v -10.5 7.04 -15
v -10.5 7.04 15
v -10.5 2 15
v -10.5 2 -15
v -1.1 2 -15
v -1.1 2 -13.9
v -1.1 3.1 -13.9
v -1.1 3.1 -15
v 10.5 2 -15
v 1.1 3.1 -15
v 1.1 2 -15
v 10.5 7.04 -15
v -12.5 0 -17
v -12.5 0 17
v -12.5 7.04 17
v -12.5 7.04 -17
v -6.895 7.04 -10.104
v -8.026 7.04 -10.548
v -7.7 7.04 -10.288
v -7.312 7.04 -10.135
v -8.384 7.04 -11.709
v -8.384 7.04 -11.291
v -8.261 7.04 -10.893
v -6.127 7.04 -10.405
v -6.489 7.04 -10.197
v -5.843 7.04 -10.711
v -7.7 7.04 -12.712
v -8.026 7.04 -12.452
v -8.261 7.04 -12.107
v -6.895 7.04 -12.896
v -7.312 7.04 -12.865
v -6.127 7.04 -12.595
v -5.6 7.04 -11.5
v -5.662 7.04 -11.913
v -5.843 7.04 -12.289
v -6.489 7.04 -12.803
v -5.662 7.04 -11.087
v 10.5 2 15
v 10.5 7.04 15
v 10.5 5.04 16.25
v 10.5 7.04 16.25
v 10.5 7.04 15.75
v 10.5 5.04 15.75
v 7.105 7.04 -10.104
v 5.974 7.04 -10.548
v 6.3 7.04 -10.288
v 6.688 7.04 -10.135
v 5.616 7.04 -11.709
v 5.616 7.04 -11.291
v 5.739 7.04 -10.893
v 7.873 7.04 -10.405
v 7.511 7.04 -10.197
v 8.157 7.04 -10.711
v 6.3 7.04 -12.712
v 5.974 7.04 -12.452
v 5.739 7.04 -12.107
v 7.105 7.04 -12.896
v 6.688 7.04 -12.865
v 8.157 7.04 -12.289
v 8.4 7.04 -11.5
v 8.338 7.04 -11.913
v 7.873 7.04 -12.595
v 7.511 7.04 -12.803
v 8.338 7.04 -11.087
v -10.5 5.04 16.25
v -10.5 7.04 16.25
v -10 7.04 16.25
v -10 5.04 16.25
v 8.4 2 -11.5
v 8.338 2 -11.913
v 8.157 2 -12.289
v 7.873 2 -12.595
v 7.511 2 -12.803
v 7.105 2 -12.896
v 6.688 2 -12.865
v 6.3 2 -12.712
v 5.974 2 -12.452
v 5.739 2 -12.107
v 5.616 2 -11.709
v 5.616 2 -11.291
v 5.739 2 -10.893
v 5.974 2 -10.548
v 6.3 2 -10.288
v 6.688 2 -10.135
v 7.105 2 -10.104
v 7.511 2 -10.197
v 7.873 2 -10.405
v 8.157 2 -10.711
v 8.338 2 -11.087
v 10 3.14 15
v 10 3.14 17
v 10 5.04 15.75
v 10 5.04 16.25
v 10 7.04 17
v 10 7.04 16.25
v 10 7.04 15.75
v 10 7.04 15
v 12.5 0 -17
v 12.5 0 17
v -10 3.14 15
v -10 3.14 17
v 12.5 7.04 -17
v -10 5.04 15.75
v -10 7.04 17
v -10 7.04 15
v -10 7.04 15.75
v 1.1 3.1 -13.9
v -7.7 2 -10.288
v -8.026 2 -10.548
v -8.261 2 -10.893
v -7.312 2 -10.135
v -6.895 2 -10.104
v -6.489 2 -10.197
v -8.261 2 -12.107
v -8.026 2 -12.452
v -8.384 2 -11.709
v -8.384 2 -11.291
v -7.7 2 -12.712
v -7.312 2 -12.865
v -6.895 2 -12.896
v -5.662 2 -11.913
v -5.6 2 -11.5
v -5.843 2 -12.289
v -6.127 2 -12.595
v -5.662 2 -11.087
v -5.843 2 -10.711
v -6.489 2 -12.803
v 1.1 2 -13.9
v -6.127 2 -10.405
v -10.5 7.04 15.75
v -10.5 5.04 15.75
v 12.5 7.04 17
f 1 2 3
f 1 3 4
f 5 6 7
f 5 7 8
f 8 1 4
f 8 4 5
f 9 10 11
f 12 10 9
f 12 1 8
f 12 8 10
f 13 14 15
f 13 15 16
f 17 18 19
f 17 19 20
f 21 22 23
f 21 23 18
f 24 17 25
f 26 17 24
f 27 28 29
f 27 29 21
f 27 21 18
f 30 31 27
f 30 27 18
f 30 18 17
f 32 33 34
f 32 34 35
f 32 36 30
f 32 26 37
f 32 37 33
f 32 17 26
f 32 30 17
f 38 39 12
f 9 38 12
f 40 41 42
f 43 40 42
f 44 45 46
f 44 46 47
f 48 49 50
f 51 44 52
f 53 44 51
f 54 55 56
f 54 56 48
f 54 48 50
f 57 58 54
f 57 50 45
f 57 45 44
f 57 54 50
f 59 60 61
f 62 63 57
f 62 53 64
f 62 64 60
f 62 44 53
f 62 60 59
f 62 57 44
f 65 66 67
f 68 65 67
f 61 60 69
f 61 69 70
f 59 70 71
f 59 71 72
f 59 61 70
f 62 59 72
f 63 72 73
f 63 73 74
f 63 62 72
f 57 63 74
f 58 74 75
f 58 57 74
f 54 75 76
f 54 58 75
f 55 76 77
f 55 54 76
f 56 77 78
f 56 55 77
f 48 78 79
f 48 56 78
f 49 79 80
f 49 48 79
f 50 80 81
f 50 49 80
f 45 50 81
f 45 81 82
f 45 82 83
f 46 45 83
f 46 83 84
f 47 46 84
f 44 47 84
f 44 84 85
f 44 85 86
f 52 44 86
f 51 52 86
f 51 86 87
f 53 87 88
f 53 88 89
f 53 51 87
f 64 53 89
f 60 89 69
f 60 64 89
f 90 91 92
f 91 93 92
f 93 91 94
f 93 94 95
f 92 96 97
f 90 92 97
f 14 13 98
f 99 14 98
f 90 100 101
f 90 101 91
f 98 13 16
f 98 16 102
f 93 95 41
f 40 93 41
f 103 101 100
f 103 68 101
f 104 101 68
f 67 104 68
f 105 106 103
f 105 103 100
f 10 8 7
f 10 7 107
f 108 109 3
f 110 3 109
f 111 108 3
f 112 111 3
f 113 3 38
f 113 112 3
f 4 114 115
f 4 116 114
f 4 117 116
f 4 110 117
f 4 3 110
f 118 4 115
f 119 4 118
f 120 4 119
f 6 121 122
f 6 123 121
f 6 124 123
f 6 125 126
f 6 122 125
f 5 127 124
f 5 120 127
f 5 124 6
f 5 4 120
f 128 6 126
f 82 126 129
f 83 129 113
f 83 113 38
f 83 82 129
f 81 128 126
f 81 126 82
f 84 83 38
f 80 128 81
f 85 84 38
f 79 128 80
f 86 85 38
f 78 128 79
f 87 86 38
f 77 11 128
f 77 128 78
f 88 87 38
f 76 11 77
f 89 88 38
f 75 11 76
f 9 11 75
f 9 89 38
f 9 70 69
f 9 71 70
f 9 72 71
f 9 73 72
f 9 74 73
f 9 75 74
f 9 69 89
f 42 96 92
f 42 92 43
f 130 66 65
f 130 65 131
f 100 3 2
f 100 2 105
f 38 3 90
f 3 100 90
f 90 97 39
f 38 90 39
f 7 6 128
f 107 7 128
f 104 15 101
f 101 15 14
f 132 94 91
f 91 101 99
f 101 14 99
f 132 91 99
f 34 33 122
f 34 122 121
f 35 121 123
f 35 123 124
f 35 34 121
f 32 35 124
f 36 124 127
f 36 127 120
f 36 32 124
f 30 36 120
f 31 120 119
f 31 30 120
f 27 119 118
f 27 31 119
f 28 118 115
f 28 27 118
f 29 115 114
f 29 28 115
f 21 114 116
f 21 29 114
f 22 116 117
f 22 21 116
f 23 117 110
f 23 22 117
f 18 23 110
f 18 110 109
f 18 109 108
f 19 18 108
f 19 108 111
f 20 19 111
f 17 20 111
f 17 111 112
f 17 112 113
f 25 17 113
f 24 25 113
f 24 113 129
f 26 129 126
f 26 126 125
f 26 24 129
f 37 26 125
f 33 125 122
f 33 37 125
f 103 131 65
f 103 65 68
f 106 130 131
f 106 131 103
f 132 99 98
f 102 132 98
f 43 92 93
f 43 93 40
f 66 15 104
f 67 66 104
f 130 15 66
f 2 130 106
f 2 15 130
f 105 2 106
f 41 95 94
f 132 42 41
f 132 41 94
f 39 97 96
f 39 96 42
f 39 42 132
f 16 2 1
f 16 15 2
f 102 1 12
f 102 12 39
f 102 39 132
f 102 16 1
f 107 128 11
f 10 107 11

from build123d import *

# Parameters (mm, degrees)
IZIM1_W                     = 25
IZIM1_H                     = 34
Y_KSEKLIK_EKSTR_ZYON1_DEPTH = 7.04
IZIM2_W                     = 21
IZIM2_H                     = 30
IZIM2_R                     = 1.4
KES_EKSTR_ZYON1_DEPTH       = 5.04
IZIM3_W                     = 20
IZIM3_H                     = 5.688553579
KES_EKSTR_ZYON2_DEPTH       = 3.9
IZIM4_W                     = 2.2
IZIM4_H                     = 1.1
Y_KSEKLIK_EKSTR_ZYON2_DEPTH = 1.1
IZIM5_W                     = 1
IZIM5_H                     = 0.5
KES_EKSTR_ZYON3_DEPTH       = 2


with BuildPart() as part:
    # Çizim1 → Yükseklik-Ekstrüzyon1 (new body)
    with BuildSketch(Plane(origin=(0, 0, 0), x_dir=(1, 0, 0), z_dir=(0, 1, 0))):
        Rectangle(IZIM1_W, IZIM1_H)
    extrude(amount=Y_KSEKLIK_EKSTR_ZYON1_DEPTH)

    # Çizim2 → Kes-Ekstrüzyon1 (cut)
    with BuildSketch(Plane(origin=(0, 7.04, 0), x_dir=(1, 0, 0), z_dir=(0, 1, 0))):
        Rectangle(IZIM2_W, IZIM2_H)
        with Locations((-7, 11.5)):
            Circle(IZIM2_R, mode=Mode.SUBTRACT)
        with Locations((7, 11.5)):
            Circle(IZIM2_R, mode=Mode.SUBTRACT)
    extrude(amount=-KES_EKSTR_ZYON1_DEPTH, mode=Mode.SUBTRACT)

    # Çizim3 → Kes-Ekstrüzyon2 (cut)
    with BuildSketch(Plane(origin=(0, 7.04, 0), x_dir=(1, 0, 0), z_dir=(0, 1, 0))):
        with Locations((0, -14.80753211)):
            Rectangle(IZIM3_W, IZIM3_H)
    extrude(amount=-KES_EKSTR_ZYON2_DEPTH, mode=Mode.SUBTRACT)

    # Çizim4 → Yükseklik-Ekstrüzyon2 (add)
    with BuildSketch(Plane(origin=(0, 2, 0), x_dir=(1, 0, 0), z_dir=(0, 1, 0))):
        with Locations((0, 14.45)):
            Rectangle(IZIM4_W, IZIM4_H)
    extrude(amount=Y_KSEKLIK_EKSTR_ZYON2_DEPTH)

    # Çizim5 → Kes-Ekstrüzyon3 (cut)
    with BuildSketch(Plane(origin=(0, 7.04, 0), x_dir=(1, 0, 0), z_dir=(0, 1, 0))):
        with Locations((-10, -16)):
            Rectangle(IZIM5_W, IZIM5_H)
        with Locations((10, -16)):
            Rectangle(IZIM5_W, IZIM5_H)
    extrude(amount=-KES_EKSTR_ZYON3_DEPTH, mode=Mode.SUBTRACT)


solid = part.part
